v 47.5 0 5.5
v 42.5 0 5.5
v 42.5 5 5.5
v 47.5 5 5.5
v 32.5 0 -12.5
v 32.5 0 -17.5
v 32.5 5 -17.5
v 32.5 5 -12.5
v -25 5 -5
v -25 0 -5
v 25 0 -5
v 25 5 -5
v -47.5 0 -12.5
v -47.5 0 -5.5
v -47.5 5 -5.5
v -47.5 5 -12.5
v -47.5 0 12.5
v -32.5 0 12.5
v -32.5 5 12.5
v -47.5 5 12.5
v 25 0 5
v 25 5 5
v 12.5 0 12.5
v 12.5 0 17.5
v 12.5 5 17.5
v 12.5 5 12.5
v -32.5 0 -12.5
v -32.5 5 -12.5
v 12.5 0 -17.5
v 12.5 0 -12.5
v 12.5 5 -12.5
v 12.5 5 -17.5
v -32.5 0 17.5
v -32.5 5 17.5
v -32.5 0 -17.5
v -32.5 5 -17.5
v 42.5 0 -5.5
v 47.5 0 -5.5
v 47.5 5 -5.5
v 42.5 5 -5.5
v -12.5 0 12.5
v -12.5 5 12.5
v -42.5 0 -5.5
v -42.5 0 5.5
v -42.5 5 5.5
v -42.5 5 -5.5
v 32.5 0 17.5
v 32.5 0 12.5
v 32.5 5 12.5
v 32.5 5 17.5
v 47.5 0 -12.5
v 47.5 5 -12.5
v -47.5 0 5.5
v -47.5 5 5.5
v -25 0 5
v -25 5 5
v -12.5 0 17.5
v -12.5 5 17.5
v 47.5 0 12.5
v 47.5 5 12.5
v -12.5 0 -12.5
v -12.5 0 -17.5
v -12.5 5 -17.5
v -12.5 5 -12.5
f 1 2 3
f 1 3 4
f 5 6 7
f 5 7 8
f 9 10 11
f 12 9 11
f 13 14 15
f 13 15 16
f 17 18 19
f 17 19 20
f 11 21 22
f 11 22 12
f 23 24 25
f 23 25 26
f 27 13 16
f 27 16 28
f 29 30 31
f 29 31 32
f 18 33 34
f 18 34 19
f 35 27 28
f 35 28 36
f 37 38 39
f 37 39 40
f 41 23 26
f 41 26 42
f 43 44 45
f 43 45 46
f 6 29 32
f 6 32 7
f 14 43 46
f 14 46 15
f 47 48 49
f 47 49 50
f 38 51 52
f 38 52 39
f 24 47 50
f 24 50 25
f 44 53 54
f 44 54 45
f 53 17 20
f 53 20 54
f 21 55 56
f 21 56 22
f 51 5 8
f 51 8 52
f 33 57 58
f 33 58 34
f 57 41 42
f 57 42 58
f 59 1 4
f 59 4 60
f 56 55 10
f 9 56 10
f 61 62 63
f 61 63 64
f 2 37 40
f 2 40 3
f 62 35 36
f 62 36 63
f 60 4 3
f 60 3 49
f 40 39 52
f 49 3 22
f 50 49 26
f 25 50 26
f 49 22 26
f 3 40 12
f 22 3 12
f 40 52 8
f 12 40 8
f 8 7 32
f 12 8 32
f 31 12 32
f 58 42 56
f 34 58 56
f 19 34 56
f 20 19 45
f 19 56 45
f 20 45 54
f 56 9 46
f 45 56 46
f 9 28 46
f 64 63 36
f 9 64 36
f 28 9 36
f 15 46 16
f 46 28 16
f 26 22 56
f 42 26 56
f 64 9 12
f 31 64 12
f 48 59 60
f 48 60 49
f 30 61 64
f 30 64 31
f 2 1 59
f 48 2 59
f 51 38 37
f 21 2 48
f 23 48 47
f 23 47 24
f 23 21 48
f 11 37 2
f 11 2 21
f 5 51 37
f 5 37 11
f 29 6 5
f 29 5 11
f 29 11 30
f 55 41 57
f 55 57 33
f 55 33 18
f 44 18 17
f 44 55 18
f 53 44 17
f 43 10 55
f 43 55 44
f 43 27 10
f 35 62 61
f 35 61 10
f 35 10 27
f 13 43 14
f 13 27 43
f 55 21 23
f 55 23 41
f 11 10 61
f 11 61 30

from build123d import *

# Parameters (mm, degrees)
SKETCH1_W           = 50
SKETCH1_H           = 10
BOSS_EXTRUDE1_DEPTH = 5


with BuildPart() as part:
    # Sketch1 → Boss-Extrude1 (new body)
    with BuildSketch(Plane(origin=(0, 0, 0), x_dir=(1, 0, 0), z_dir=(0, 1, 0))):
        Polygon((-12.5, 12.5), (12.5, 12.5), (12.5, 17.5), (32.5, 17.5), (32.5, 12.5), (47.5, 12.5), (47.5, 5.5), (42.5, 5.5), (42.5, -5.5), (47.5, -5.5), (47.5, -12.5), (32.5, -12.5), (32.5, -17.5), (12.5, -17.5), (12.5, -12.5), (-12.5, -12.5), (-12.5, -17.5), (-32.5, -17.5), (-32.5, -12.5), (-47.5, -12.5), (-47.5, -5.5), (-42.5, -5.5), (-42.5, 5.5), (-47.5, 5.5), (-47.5, 12.5), (-32.5, 12.5), (-32.5, 17.5), (-12.5, 17.5), align=None)
        Rectangle(SKETCH1_W, SKETCH1_H, mode=Mode.SUBTRACT)
    extrude(amount=BOSS_EXTRUDE1_DEPTH)


solid = part.part
